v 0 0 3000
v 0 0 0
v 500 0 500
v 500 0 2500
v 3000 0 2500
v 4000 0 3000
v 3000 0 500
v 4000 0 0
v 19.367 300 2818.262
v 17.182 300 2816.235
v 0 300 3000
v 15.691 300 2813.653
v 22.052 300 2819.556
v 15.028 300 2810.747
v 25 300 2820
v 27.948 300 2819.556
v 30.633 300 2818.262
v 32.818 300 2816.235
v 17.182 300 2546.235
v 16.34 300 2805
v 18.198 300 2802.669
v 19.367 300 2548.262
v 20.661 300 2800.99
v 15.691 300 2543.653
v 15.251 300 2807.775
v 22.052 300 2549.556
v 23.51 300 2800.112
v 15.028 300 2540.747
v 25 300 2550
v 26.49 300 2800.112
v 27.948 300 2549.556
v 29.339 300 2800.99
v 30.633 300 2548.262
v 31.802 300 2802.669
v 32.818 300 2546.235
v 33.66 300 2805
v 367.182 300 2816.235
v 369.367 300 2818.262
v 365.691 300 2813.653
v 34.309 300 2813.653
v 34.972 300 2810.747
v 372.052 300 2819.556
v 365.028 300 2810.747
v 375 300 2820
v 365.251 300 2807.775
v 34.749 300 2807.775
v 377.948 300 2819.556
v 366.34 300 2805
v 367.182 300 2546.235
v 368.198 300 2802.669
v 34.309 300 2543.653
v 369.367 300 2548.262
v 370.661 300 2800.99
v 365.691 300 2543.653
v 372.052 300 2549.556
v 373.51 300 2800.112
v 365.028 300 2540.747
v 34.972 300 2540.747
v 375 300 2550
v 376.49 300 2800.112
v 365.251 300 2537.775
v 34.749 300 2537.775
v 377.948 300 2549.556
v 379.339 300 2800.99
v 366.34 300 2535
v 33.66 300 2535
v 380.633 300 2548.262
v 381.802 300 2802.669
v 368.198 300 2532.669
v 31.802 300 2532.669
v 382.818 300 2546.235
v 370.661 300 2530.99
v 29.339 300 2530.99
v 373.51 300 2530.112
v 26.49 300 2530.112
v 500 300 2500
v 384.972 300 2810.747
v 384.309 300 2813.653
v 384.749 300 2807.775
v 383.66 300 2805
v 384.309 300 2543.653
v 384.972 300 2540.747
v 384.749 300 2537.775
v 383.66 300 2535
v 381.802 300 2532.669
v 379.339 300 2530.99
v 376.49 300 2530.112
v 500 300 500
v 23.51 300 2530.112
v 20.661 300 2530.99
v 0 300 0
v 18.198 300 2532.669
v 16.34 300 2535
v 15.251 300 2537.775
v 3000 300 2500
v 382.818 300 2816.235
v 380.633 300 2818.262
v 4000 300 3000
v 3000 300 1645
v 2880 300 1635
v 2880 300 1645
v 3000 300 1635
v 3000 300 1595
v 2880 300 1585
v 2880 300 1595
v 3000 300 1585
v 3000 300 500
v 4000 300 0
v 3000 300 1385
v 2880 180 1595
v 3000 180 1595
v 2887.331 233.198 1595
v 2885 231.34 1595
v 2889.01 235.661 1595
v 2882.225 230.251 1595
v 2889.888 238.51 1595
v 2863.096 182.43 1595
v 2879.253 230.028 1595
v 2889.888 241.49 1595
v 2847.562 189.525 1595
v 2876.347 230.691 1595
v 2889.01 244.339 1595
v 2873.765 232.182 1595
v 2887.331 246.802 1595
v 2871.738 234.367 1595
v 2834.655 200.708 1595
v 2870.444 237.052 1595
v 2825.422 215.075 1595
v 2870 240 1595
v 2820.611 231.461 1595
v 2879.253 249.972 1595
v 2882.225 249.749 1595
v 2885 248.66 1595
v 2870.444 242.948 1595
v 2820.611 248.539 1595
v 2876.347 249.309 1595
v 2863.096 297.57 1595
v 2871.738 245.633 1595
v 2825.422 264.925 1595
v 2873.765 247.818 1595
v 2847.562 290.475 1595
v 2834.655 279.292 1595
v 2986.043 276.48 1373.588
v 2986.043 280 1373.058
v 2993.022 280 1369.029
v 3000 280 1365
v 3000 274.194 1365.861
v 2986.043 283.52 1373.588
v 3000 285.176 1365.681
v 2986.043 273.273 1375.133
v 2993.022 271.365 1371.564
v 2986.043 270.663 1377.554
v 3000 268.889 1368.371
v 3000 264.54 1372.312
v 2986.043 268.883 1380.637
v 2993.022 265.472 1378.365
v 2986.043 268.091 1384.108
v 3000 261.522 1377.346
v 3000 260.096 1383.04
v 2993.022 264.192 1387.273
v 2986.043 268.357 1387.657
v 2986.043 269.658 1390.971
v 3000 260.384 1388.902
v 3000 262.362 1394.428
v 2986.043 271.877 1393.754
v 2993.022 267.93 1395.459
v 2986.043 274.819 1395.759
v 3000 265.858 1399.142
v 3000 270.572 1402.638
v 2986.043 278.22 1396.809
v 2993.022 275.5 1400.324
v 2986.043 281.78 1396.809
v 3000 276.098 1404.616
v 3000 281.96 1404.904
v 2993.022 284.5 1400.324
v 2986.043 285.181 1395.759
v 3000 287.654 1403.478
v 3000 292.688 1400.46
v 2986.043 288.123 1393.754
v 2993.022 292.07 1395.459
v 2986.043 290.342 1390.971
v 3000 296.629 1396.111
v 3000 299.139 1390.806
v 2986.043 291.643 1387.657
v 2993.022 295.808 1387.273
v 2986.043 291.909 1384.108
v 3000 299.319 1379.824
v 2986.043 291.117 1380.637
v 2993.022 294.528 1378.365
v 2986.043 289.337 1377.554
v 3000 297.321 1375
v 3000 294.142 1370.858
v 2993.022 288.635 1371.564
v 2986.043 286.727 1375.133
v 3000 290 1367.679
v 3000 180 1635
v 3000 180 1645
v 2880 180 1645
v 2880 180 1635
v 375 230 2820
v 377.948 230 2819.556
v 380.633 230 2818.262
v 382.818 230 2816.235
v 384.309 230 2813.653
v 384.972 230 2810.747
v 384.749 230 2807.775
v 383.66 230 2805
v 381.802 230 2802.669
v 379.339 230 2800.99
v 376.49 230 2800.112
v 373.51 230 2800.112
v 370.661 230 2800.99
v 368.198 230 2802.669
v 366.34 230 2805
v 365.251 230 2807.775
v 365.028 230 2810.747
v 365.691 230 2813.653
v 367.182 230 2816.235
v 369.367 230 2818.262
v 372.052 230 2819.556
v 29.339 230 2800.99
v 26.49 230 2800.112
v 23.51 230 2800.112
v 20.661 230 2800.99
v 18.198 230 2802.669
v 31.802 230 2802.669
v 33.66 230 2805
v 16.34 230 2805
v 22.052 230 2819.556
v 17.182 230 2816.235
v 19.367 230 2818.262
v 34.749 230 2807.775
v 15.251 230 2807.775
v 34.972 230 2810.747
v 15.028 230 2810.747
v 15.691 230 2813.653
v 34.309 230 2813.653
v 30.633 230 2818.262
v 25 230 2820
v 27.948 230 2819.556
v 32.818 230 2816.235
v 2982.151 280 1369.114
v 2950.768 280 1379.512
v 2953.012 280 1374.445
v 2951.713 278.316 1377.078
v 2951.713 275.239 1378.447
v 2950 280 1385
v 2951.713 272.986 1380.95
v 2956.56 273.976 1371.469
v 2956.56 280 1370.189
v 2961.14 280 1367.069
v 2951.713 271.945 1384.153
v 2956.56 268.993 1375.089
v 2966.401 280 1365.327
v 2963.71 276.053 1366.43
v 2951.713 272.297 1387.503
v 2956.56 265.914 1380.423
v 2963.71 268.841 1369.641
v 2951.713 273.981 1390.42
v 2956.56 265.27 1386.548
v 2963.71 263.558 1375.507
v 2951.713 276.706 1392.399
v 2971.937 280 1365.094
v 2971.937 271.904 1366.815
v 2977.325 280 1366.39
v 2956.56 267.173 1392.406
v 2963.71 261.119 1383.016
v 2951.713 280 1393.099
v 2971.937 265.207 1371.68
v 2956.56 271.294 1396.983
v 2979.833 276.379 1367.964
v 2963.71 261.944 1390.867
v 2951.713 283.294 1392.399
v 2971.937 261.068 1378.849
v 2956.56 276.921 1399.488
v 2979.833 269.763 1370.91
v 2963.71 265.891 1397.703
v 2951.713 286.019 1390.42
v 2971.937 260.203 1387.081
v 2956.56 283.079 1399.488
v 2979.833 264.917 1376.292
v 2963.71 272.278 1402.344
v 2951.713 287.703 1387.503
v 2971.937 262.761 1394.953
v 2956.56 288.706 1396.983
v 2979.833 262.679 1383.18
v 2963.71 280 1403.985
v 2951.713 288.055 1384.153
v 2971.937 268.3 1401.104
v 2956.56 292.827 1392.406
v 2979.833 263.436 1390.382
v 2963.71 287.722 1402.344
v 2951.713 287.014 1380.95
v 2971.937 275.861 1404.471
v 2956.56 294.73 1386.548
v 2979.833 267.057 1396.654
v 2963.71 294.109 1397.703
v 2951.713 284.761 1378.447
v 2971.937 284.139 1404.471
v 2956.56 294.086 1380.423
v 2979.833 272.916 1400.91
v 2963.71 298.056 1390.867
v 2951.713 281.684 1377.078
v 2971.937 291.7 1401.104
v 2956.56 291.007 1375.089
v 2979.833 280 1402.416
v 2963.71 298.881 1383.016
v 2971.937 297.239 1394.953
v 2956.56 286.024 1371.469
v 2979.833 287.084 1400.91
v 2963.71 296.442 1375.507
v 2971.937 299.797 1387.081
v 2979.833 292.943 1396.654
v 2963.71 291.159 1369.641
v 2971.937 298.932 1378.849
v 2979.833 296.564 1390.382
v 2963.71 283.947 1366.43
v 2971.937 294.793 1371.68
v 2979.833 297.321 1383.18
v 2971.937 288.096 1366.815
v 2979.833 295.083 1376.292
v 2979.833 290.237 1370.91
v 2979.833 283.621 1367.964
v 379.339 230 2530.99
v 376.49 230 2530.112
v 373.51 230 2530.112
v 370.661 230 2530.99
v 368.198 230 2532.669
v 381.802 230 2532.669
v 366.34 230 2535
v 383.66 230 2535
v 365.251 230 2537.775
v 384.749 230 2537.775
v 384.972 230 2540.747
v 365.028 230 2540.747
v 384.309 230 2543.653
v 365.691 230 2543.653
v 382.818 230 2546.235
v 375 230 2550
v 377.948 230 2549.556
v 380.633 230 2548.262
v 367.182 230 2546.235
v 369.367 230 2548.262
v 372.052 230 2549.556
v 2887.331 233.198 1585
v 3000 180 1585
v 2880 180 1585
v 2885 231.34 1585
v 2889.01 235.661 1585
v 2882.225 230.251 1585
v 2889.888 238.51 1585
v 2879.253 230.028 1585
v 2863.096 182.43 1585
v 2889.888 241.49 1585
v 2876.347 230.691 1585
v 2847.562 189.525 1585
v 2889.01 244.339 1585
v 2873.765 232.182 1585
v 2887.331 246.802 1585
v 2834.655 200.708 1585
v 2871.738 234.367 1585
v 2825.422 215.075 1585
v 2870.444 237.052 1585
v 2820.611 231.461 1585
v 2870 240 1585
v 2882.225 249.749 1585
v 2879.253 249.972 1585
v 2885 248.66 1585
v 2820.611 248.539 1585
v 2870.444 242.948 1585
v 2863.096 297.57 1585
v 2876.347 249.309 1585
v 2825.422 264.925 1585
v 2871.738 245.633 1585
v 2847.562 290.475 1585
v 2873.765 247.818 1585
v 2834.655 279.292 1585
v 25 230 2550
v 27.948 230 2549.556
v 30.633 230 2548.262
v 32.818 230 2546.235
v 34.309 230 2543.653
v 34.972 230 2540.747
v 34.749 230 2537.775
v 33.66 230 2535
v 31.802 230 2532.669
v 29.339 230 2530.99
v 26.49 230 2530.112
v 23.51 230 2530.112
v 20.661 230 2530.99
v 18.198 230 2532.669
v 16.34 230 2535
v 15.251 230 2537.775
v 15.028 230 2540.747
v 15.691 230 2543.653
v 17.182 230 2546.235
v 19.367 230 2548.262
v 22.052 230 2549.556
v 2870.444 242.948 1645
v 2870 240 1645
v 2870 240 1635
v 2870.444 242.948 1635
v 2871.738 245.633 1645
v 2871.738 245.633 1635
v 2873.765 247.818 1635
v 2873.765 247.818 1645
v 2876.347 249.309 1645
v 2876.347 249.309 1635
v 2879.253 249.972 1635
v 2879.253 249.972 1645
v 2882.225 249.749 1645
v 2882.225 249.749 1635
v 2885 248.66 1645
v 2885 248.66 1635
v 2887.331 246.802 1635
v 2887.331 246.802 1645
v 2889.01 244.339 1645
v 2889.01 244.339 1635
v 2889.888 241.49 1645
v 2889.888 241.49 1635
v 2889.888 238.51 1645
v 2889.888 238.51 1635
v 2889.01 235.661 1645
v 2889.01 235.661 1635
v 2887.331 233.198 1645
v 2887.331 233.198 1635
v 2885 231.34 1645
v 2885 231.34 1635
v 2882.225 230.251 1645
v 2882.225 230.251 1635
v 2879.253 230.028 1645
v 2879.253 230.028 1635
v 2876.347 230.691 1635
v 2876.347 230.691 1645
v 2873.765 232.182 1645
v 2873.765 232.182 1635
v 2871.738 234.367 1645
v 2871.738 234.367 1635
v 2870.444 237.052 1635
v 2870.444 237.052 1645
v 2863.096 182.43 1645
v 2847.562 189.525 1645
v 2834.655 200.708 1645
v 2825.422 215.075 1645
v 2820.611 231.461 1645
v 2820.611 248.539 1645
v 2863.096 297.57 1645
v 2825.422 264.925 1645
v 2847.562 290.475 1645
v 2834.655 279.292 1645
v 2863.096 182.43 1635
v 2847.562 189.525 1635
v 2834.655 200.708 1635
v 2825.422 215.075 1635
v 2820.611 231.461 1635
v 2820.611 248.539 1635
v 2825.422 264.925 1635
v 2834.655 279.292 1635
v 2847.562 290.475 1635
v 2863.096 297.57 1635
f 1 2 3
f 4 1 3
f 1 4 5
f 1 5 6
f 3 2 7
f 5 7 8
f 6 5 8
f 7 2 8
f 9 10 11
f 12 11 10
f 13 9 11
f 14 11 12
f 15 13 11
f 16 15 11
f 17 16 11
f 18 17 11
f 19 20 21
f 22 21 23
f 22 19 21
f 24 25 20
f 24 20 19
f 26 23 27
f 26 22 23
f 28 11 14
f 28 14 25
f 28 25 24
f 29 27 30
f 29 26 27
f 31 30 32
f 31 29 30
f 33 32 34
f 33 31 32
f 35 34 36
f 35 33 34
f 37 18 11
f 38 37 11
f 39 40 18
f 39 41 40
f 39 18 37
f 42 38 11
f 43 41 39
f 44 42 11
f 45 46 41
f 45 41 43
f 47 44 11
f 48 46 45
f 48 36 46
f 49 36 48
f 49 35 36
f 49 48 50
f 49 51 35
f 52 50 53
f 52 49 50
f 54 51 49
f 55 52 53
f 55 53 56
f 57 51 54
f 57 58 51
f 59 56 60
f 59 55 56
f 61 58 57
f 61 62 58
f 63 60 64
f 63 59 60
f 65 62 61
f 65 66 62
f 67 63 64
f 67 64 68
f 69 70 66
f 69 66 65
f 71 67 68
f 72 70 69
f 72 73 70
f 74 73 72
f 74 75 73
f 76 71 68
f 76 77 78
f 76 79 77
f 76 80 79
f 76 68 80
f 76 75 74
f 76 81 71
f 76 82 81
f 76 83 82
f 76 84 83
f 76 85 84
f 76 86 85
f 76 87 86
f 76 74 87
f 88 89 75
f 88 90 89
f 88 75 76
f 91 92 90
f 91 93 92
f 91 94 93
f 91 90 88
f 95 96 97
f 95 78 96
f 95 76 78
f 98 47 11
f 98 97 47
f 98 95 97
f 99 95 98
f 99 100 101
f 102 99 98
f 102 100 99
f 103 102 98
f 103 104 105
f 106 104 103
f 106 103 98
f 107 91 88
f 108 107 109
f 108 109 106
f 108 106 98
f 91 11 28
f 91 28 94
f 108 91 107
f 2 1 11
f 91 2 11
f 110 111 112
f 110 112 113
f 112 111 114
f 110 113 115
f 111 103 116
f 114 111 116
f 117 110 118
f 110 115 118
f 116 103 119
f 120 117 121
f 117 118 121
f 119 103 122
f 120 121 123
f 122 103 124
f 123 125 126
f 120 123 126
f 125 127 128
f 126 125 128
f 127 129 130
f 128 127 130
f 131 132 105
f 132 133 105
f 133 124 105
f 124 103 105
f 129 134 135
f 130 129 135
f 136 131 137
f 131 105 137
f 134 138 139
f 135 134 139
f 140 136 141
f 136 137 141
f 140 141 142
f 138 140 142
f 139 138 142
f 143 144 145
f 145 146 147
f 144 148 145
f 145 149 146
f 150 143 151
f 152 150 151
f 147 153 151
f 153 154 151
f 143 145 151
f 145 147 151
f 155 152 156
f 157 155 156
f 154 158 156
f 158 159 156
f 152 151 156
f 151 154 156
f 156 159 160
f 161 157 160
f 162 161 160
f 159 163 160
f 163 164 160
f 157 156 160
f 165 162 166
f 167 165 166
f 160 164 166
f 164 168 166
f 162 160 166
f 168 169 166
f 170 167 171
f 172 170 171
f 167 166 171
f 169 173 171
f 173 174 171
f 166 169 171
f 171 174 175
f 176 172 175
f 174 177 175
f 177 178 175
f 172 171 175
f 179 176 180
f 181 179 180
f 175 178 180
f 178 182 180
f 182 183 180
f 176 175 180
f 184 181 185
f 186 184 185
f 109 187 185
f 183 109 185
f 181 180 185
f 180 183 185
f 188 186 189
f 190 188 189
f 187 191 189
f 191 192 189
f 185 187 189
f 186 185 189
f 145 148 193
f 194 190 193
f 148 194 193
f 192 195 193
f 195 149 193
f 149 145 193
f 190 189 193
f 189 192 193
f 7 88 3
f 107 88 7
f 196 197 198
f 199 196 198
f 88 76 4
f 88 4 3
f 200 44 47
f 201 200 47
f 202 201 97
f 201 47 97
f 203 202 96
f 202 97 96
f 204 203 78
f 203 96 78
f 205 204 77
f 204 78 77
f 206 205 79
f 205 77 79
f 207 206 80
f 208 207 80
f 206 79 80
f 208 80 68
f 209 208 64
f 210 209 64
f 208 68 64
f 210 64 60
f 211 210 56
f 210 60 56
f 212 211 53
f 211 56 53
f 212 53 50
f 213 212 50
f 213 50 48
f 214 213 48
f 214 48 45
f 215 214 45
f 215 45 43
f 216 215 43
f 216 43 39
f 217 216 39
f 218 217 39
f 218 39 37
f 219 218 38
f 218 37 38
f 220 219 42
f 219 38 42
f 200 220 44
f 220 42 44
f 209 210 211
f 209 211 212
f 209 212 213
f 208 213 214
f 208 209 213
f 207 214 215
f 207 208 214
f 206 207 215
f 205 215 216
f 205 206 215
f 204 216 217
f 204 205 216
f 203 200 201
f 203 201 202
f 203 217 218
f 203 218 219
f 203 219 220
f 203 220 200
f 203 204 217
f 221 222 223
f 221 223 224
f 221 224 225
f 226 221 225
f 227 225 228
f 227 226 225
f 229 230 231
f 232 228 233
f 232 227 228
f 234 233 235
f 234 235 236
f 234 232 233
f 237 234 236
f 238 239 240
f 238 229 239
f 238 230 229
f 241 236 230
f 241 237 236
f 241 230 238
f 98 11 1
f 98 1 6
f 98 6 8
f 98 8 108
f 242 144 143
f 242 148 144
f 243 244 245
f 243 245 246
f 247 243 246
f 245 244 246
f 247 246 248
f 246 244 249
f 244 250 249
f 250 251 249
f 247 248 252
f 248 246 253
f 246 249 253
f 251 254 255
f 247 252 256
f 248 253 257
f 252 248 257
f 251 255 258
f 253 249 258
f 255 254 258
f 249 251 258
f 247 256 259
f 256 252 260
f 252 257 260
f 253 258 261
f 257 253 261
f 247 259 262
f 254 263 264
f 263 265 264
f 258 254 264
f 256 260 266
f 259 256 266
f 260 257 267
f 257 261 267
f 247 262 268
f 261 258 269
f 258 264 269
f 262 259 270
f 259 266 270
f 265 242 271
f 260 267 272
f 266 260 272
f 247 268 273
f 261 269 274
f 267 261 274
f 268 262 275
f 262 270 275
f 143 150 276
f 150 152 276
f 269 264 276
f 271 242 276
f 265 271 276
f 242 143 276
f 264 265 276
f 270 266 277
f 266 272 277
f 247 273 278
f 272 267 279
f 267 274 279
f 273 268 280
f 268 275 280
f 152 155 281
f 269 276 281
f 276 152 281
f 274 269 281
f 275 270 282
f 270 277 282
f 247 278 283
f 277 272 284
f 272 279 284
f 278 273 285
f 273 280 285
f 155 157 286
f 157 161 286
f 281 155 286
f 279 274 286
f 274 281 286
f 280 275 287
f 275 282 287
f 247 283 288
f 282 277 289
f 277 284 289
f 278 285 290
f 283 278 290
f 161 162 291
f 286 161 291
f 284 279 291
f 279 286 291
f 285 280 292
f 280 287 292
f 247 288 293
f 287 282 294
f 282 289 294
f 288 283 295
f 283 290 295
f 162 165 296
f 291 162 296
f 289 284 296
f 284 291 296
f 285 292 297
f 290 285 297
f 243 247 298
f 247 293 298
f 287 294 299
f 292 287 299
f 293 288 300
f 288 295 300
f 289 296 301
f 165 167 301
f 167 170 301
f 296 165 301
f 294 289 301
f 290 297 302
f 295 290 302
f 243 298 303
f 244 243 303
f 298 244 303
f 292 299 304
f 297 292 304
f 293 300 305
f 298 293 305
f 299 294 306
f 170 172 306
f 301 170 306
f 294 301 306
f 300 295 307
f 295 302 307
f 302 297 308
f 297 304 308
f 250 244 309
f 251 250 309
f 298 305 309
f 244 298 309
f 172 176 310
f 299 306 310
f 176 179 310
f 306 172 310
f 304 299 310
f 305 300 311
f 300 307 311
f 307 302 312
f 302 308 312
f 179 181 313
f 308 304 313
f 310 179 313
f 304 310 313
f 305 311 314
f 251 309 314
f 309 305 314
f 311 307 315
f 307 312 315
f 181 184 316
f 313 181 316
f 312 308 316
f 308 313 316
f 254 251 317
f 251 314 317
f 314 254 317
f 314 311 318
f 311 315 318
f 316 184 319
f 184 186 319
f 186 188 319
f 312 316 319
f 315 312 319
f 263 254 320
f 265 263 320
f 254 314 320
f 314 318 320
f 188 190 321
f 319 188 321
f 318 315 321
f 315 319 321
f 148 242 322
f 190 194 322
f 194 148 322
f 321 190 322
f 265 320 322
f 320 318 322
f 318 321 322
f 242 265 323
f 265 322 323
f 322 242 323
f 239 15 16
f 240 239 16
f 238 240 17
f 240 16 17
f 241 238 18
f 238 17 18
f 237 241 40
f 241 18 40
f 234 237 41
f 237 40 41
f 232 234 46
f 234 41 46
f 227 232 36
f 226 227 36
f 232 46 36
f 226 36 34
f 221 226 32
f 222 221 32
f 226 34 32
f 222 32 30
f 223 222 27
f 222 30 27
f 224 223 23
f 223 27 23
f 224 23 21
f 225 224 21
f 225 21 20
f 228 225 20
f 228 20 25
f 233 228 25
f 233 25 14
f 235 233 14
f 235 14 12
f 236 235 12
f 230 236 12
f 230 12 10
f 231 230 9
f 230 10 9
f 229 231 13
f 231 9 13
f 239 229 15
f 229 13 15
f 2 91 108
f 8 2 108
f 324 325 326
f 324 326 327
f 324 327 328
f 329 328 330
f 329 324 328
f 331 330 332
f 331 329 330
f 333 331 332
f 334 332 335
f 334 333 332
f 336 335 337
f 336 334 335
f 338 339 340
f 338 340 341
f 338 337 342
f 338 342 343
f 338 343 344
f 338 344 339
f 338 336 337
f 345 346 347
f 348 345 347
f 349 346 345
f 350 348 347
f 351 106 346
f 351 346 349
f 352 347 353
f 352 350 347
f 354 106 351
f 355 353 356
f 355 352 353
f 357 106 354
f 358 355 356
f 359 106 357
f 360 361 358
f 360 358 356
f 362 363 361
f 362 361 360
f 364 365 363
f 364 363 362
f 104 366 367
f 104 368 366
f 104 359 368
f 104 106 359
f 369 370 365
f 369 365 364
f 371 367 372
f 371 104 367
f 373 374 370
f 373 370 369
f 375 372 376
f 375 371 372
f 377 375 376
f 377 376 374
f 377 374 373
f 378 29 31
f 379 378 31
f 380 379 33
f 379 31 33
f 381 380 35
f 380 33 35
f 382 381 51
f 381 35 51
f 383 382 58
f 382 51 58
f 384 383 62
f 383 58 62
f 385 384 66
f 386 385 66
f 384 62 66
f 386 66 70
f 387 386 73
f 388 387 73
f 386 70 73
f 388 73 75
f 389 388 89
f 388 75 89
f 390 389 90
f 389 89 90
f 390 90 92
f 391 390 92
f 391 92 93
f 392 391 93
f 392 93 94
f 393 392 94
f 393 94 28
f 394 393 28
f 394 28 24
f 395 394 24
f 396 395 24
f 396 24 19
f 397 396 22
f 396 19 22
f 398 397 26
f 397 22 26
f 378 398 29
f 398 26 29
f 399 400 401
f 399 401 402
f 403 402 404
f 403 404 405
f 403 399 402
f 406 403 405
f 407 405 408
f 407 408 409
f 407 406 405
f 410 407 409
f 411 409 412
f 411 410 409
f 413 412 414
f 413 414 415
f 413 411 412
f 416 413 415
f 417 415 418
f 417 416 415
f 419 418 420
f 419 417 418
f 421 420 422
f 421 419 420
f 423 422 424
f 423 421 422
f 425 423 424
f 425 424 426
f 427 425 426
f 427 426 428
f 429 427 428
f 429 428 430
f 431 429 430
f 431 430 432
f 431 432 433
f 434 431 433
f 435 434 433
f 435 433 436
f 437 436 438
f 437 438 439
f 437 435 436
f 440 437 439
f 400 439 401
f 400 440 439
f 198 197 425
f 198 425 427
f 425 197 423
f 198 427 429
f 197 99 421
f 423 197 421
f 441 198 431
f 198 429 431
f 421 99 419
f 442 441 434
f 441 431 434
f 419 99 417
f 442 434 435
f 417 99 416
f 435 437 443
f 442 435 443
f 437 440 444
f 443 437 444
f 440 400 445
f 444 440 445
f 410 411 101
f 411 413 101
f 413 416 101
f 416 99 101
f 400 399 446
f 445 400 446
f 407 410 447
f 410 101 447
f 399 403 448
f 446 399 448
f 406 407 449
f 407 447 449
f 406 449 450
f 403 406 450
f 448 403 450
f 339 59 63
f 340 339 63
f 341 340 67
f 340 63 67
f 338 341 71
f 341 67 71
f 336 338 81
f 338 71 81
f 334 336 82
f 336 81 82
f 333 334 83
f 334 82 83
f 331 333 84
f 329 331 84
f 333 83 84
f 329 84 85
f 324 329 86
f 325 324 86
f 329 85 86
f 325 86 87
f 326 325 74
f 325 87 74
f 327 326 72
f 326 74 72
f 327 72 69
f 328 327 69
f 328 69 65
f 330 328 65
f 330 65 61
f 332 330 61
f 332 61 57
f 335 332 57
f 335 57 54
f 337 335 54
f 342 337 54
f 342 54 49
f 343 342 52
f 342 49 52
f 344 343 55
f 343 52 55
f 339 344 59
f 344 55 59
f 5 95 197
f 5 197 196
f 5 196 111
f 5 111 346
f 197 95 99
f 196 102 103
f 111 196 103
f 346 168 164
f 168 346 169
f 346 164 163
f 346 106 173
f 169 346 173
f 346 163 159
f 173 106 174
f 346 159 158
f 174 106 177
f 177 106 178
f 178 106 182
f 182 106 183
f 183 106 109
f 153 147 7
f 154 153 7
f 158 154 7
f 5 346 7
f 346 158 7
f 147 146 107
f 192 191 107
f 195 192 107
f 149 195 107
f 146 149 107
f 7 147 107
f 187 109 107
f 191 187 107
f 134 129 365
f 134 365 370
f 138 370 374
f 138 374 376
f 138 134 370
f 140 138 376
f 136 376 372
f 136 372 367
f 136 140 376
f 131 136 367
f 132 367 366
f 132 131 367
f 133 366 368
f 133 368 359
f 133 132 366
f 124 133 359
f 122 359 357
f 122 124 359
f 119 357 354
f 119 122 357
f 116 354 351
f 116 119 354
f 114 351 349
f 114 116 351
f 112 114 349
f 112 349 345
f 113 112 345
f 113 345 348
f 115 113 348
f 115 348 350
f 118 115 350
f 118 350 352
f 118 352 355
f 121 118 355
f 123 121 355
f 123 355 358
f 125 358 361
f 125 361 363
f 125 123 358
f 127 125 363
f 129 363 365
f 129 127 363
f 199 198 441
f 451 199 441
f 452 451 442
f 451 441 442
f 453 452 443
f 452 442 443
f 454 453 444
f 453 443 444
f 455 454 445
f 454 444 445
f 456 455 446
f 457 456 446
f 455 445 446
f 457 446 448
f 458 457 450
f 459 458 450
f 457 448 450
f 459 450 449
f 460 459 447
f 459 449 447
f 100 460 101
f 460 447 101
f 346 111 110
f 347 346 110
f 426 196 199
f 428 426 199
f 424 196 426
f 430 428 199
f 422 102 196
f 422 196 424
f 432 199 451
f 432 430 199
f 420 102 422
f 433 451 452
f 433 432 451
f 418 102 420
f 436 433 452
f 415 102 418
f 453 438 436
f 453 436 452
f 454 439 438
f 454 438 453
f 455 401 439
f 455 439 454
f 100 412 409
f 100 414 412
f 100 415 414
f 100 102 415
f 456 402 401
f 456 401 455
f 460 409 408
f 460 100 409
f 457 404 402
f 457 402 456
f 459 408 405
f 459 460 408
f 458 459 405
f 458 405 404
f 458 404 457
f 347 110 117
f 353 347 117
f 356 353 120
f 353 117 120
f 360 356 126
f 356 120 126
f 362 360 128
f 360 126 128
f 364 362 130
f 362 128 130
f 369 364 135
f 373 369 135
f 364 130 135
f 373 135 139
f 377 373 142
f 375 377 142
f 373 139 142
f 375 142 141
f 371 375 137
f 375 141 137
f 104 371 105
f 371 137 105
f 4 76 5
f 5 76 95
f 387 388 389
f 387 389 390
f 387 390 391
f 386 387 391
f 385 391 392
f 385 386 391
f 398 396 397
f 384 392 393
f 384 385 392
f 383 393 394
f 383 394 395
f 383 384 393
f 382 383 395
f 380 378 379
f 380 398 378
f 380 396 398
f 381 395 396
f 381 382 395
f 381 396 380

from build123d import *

# Parameters (mm, degrees)
SKETCH1_W           = 4000
SKETCH1_H           = 300
BOSS_EXTRUDE1_DEPTH = 3000
SKETCH3_W           = 2500
SKETCH3_H           = 2000
CUT_EXTRUDE1_DEPTH  = 3000
SKETCH6_R           = 10
BOSS_EXTRUDE2_DEPTH = 10
SKETCH7_R           = 10
BOSS_EXTRUDE3_DEPTH = 10
SKETCH9_R           = 10
CUT_EXTRUDE2_DEPTH  = 70


with BuildPart() as part:
    # Sketch1 → Boss-Extrude1 (new body)
    with BuildSketch(Plane.XY):
        with Locations((2000, 150)):
            Rectangle(SKETCH1_W, SKETCH1_H)
    extrude(amount=BOSS_EXTRUDE1_DEPTH)

    # Sketch3 → Cut-Extrude1 (cut)
    with BuildSketch(Plane(origin=(0, 300, 0), x_dir=(1, 0, 0), z_dir=(0, 1, 0))):
        with Locations((1750, -1500)):
            Rectangle(SKETCH3_W, SKETCH3_H)
    extrude(amount=-CUT_EXTRUDE1_DEPTH, mode=Mode.SUBTRACT)

    # Sketch6 → Boss-Extrude2 (add)
    with BuildSketch(Plane(origin=(0, 0, 1645), x_dir=(-1, 0, 0), z_dir=(0, 0, -1))):
        with BuildLine():
            Line((-3000, 300), (-3000, 180))
            Line((-3000, 180), (-2880, 180))
            ThreePointArc((-2880, 180), (-2820, 240), (-2880, 300))
            Line((-2880, 300), (-3000, 300))
        make_face()
        with Locations((-2880, 240)):
            Circle(SKETCH6_R, mode=Mode.SUBTRACT)
    extrude(amount=BOSS_EXTRUDE2_DEPTH)

    # Sketch7 → Boss-Extrude3 (add)
    with BuildSketch(Plane(origin=(0, 0, 1595), x_dir=(-1, 0, 0), z_dir=(0, 0, -1))):
        with BuildLine():
            Line((-3000, 300), (-3000, 180))
            Line((-3000, 180), (-2880, 180))
            ThreePointArc((-2880, 180), (-2820, 240), (-2880, 300))
            Line((-2880, 300), (-3000, 300))
        make_face()
        with Locations((-2880, 240)):
            Circle(SKETCH7_R, mode=Mode.SUBTRACT)
    extrude(amount=BOSS_EXTRUDE3_DEPTH)

    # Sketch8 → Revolve1 (revolve)
    with BuildSketch(Plane(origin=(0, 0, 1385), x_dir=(-1, 0, 0), z_dir=(0, 0, -1)), mode=Mode.PRIVATE) as revolve1_sk:
        with BuildLine():
            Line((-3000, 300), (-3000, 280))
            Line((-3000, 280), (-2950, 280))
            ThreePointArc((-2950, 280), (-2963.709750078, 298.985066655), (-2986.043275591, 291.942081406))
            Line((-2986.043275591, 291.942081406), (-3000, 300))
        make_face()
    revolve(revolve1_sk.sketch.rotate(Axis((3000, 280, 1385), (-1, 0, 0)), 90), axis=Axis((3000, 280, 1385), (-1, 0, 0)))

    # Sketch9 → Cut-Extrude2 (cut)
    with BuildSketch(Plane(origin=(0, 300, 0), x_dir=(1, 0, 0), z_dir=(0, 1, 0))):
        with Locations(Location((25, -2540, 0), (0, 0, 270))):
            Circle(SKETCH9_R)
        with Locations(Location((375, -2540, 0), (0, 0, 270))):
            Circle(SKETCH9_R)
        with Locations(Location((25, -2810, 0), (0, 0, 270))):
            Circle(SKETCH9_R)
        with Locations(Location((375, -2810, 0), (0, 0, 270))):
            Circle(SKETCH9_R)
    extrude(amount=-CUT_EXTRUDE2_DEPTH, mode=Mode.SUBTRACT)


solid = part.part
